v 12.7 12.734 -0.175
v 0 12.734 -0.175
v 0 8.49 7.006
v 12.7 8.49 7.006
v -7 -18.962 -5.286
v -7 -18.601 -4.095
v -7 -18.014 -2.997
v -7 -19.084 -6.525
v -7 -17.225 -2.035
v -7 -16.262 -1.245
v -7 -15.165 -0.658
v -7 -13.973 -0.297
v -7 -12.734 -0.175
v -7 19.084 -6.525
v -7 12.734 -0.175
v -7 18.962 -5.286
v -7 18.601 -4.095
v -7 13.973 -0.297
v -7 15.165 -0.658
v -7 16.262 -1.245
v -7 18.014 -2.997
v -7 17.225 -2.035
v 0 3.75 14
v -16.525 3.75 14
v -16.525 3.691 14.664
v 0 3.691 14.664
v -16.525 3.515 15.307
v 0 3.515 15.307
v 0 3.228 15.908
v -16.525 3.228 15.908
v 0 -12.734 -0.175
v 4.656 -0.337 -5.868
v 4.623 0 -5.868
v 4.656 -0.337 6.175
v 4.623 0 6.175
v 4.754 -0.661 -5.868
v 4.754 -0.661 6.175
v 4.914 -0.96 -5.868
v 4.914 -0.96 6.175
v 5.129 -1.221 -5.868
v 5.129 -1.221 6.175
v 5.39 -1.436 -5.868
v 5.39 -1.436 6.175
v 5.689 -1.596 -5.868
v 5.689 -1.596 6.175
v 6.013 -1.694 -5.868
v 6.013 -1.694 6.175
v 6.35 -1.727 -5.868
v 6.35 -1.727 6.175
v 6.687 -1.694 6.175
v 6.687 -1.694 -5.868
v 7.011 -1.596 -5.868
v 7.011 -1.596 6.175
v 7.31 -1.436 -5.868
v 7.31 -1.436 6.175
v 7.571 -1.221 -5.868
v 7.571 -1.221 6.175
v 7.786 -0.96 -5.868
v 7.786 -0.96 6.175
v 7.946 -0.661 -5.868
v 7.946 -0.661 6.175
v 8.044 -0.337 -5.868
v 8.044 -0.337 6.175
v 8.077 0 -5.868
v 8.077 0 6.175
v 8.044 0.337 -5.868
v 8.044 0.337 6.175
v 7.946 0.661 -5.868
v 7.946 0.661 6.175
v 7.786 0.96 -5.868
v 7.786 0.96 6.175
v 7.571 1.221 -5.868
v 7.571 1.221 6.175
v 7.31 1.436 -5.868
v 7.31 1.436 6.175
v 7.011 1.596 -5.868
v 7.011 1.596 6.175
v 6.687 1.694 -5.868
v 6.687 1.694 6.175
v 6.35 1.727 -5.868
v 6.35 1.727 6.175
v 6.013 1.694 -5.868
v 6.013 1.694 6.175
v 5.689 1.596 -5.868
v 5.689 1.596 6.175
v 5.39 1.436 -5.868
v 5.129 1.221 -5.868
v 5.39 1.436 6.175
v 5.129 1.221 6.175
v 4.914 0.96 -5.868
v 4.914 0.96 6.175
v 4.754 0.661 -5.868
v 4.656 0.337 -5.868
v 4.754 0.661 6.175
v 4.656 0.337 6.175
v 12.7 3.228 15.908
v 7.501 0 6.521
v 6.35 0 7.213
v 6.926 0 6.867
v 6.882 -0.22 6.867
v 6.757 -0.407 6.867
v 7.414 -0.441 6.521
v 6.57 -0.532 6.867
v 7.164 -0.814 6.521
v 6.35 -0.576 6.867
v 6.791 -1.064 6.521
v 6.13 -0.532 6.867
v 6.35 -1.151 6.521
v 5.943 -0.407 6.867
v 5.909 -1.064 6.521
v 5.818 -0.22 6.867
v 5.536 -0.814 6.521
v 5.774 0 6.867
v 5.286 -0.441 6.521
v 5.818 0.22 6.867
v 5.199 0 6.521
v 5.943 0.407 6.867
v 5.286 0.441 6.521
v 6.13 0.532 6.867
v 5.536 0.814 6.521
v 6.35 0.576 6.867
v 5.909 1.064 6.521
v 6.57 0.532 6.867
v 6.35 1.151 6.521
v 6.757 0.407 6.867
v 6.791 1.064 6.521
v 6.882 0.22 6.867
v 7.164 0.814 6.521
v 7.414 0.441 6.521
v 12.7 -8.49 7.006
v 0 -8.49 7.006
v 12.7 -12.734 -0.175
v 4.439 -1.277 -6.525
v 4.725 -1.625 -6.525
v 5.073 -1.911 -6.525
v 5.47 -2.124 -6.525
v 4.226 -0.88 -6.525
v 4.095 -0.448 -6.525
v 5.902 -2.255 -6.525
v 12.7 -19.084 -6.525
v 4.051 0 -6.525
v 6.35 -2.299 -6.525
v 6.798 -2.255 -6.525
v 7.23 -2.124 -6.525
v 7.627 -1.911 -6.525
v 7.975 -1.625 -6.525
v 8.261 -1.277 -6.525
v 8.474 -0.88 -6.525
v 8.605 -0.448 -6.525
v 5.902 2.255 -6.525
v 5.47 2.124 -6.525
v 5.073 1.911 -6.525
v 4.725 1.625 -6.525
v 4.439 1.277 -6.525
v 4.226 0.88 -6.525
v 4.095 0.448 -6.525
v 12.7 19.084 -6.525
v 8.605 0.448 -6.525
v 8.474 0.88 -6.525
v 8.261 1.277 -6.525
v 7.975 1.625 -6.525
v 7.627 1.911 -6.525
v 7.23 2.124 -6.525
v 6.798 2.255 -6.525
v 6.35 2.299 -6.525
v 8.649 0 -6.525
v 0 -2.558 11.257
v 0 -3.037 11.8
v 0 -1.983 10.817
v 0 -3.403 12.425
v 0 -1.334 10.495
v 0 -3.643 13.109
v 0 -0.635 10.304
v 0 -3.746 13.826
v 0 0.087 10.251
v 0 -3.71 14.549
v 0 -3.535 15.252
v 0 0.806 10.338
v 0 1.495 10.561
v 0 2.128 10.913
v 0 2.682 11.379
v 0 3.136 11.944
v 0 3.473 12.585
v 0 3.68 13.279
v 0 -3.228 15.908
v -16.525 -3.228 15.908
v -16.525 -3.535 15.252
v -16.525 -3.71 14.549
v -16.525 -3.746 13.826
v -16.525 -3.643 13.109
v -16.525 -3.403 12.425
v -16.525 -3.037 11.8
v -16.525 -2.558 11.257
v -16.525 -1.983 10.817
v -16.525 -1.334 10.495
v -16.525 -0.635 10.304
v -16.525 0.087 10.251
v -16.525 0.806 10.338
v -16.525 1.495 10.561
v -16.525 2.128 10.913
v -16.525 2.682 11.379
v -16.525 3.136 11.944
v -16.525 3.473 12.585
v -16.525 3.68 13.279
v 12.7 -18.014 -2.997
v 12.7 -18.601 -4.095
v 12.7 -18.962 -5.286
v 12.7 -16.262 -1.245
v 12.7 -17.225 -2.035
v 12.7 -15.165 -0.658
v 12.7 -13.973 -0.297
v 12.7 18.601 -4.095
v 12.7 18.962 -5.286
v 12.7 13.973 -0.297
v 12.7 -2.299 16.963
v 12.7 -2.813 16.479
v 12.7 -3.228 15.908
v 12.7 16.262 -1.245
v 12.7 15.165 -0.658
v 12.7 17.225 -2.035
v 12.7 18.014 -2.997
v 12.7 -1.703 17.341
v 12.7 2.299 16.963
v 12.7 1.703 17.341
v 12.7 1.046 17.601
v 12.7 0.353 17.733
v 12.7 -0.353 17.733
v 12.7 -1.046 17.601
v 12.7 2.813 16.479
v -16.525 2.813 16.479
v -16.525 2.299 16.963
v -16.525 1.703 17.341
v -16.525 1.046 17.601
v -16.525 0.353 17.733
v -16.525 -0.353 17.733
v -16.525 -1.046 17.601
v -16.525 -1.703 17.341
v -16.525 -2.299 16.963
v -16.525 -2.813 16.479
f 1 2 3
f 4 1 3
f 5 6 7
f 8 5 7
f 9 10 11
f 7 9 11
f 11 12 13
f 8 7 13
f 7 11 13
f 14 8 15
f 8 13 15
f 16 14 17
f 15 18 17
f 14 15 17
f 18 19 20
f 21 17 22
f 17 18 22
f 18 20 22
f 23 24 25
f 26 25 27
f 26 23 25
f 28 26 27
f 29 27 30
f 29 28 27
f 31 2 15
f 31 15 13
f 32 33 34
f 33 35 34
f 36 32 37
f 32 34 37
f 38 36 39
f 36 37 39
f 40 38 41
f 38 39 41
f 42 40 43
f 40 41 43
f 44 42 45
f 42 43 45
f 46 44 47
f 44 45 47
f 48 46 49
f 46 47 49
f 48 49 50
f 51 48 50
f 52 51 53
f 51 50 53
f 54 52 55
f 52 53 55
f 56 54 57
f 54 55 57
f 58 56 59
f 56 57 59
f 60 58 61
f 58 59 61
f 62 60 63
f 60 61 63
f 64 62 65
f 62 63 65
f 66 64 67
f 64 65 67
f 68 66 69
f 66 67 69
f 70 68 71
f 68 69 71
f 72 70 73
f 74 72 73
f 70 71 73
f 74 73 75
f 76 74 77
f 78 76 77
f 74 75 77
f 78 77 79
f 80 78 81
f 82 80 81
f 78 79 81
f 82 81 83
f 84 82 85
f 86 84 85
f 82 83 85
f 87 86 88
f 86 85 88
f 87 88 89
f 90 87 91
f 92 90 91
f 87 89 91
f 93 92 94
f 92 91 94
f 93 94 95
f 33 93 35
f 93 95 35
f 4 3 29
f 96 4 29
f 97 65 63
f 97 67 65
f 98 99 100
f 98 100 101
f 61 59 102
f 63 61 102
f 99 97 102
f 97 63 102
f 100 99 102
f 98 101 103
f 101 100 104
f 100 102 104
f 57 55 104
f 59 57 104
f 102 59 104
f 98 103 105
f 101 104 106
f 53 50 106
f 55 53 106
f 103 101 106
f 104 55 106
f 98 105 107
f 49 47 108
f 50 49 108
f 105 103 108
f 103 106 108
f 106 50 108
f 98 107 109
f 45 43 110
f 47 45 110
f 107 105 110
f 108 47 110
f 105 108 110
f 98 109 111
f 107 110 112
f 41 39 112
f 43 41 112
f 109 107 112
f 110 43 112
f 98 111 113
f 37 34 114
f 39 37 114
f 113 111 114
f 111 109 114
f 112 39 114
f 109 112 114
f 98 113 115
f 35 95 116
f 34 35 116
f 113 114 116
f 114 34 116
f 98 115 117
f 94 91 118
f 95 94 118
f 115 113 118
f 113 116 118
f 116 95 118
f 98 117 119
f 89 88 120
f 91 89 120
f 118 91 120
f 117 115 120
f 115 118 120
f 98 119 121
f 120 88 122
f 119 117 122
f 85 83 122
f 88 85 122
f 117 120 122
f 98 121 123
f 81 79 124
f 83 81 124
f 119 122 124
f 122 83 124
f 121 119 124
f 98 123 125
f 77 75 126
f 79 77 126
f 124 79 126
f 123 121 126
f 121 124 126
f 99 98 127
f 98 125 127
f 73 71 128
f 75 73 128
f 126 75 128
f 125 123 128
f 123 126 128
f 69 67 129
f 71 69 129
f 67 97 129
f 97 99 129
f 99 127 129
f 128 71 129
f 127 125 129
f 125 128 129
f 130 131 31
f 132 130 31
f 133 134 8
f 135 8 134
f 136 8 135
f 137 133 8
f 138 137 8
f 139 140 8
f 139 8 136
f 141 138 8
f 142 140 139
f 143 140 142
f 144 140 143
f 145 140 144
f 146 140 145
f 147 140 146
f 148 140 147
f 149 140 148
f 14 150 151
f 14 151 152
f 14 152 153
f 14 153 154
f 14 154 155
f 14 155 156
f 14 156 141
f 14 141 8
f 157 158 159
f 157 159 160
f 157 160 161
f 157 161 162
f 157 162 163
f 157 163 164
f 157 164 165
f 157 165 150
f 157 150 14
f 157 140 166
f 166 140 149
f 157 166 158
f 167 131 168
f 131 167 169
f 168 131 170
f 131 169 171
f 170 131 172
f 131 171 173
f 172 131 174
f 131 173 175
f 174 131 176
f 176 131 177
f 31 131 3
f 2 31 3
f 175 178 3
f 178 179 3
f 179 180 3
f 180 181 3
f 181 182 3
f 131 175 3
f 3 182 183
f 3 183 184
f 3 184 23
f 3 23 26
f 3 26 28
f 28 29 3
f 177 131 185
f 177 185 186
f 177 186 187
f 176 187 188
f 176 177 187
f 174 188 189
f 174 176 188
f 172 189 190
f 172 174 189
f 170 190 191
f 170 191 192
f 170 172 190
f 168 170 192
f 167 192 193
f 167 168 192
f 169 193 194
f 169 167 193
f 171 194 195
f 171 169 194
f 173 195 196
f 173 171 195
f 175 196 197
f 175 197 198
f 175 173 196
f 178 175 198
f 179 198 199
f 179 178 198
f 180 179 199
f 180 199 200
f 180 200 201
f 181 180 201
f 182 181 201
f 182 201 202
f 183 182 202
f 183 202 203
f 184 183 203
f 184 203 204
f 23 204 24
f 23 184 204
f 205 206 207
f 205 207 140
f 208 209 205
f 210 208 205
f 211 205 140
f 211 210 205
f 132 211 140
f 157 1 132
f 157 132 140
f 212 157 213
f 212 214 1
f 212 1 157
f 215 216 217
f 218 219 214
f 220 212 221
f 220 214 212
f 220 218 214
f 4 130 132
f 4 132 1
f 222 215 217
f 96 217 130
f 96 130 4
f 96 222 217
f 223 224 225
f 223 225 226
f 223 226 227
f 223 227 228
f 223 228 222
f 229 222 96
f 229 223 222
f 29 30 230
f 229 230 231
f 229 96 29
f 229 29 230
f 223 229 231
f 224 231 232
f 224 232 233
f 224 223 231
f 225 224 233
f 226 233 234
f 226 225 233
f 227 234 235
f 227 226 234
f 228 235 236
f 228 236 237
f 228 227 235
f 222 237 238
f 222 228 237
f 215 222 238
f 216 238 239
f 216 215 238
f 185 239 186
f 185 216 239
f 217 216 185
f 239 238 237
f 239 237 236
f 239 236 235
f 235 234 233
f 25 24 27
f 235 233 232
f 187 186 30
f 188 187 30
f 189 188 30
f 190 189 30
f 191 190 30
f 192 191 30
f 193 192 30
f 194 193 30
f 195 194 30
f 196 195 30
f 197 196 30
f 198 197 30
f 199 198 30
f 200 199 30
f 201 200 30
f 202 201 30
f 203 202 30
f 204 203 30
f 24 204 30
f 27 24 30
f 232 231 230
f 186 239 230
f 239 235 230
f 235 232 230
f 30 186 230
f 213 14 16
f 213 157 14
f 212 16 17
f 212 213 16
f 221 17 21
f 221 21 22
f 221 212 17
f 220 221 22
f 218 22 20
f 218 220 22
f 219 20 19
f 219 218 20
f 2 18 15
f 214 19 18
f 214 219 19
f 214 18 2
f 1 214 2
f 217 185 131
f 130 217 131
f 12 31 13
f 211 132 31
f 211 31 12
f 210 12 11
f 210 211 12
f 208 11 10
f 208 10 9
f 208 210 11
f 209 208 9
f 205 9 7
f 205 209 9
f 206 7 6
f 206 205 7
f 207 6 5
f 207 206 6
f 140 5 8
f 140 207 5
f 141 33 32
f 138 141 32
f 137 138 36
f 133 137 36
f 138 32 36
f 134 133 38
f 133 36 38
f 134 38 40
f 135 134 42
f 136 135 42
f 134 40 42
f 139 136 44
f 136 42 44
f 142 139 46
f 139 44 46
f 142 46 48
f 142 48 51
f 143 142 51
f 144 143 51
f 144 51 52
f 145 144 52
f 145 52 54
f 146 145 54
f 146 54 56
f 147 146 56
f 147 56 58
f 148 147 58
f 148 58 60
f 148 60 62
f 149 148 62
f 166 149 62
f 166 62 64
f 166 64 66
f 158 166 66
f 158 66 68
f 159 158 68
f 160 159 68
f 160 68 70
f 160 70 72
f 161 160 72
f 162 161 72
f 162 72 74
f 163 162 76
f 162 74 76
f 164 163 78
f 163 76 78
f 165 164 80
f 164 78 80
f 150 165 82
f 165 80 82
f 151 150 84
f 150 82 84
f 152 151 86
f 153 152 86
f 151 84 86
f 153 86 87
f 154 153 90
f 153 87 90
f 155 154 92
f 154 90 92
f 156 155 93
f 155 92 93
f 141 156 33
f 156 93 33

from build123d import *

# Parameters (mm, degrees)
F0_W           = 8.4991231561
F0_H           = 6.35
F1_DEPTH       = 12.7
F2_DEPTH       = 16.525
F3_DEPTH       = 7
F5_D           = 3.4544
F5_DEPTH       = 12.7
F5_CSINK_D     = 4.5974
F5_CSINK_ANGLE = 82
F5_TIP         = 1.0378064612


# Not quite as in the source:
# - a length typed as a fraction of an inch, garbled in the dataset ("3 / 203.2 mm" for 3/8 in), is restored


with BuildPart() as f1:
    # F0 (on Right) → F1 (new body)
    with BuildSketch(Plane.YZ):
        with BuildLine():
            ThreePointArc((19.0844833851, -6.525), (17.2246114456, -2.0348719395), (12.7344833851, -0.175))
            Line((12.7344833851, -0.175), (8.4991231561, -0.175))
            Line((8.4991231561, -0.175), (8.4991231561, -6.525))
            Line((8.4991231561, -6.525), (19.0844833851, -6.525))
        make_face()
        with BuildLine():
            Line((-8.4991231561, -0.175), (-12.7344833851, -0.175))
            ThreePointArc((-12.7344833851, -0.175), (-17.2246114456, -2.0348719395), (-19.0844833851, -6.525))
            Line((-19.0844833851, -6.525), (-8.4991231561, -6.525))
            Line((-8.4991231561, -6.525), (-8.4991231561, -0.175))
        make_face()
        with BuildLine():
            ThreePointArc((8.4901041675, 7.0058502143), (0, 3), (-8.4901041675, 7.0058502143))
            Line((-8.4901041675, 7.0058502143), (-12.7344833851, -0.175))
            Line((-12.7344833851, -0.175), (-8.4991231561, -0.175))
            Line((-8.4991231561, -0.175), (0, -0.175))
            Line((0, -0.175), (8.4991231561, -0.175))
            Line((8.4991231561, -0.175), (12.7344833851, -0.175))
            Line((12.7344833851, -0.175), (8.4901041675, 7.0058502143))
        make_face()
        with BuildLine():
            Line((-3.2282481135, 15.9081179517), (-8.4901041675, 7.0058502143))
            ThreePointArc((-8.4901041675, 7.0058502143), (0, 3), (8.4901041675, 7.0058502143))
            Line((8.4901041675, 7.0058502143), (3.2282481135, 15.9081179517))
            ThreePointArc((3.2282481135, 15.9081179517), (3.6172109716, 14.9890828009), (3.75, 14))
            ThreePointArc((3.75, 14), (-0.9890828009, 10.3827890284), (-3.2282481135, 15.9081179517))
        make_face()
        with BuildLine():
            ThreePointArc((3.2282481135, 15.9081179517), (0, 17.75), (-3.2282481135, 15.9081179517))
            ThreePointArc((-3.2282481135, 15.9081179517), (-0.9890828009, 10.3827890284), (3.75, 14))
            ThreePointArc((3.75, 14), (3.6172109716, 14.9890828009), (3.2282481135, 15.9081179517))
        make_face()
        with Locations((4.249561578, -3.35)):
            Rectangle(F0_W, F0_H)
        with Locations((-4.249561578, -3.35)):
            Rectangle(F0_W, F0_H)
    extrude(amount=F1_DEPTH)

    # F0 (on Right) → F2 (join)
    with BuildSketch(Plane.YZ):
        with BuildLine():
            ThreePointArc((3.2282481135, 15.9081179517), (0, 17.75), (-3.2282481135, 15.9081179517))
            ThreePointArc((-3.2282481135, 15.9081179517), (-0.9890828009, 10.3827890284), (3.75, 14))
            ThreePointArc((3.75, 14), (3.6172109716, 14.9890828009), (3.2282481135, 15.9081179517))
        make_face()
    extrude(amount=-F2_DEPTH)

    # F0 (on Right) → F3 (join)
    with BuildSketch(Plane.YZ):
        with BuildLine():
            ThreePointArc((19.0844833851, -6.525), (17.2246114456, -2.0348719395), (12.7344833851, -0.175))
            Line((12.7344833851, -0.175), (8.4991231561, -0.175))
            Line((8.4991231561, -0.175), (8.4991231561, -6.525))
            Line((8.4991231561, -6.525), (19.0844833851, -6.525))
        make_face()
        with BuildLine():
            Line((-8.4991231561, -0.175), (-12.7344833851, -0.175))
            ThreePointArc((-12.7344833851, -0.175), (-17.2246114456, -2.0348719395), (-19.0844833851, -6.525))
            Line((-19.0844833851, -6.525), (-8.4991231561, -6.525))
            Line((-8.4991231561, -6.525), (-8.4991231561, -0.175))
        make_face()
        with Locations((4.249561578, -3.35)):
            Rectangle(F0_W, F0_H)
        with Locations((-4.249561578, -3.35)):
            Rectangle(F0_W, F0_H)
    extrude(amount=-F3_DEPTH)

    # F5
    with Locations(Plane(origin=(0, 0, -6.525), x_dir=(1, 0, 0), z_dir=(0, 0, -1))):
        with Locations((6.35, 0)):
            CounterSinkHole(F5_D / 2, F5_CSINK_D / 2, depth=F5_DEPTH, counter_sink_angle=F5_CSINK_ANGLE)
            with Locations((0, 0, -(F5_DEPTH + F5_TIP / 2))):  # 118° drill point
                Cone(0, F5_D / 2, F5_TIP, mode=Mode.SUBTRACT)


solid = f1.part
